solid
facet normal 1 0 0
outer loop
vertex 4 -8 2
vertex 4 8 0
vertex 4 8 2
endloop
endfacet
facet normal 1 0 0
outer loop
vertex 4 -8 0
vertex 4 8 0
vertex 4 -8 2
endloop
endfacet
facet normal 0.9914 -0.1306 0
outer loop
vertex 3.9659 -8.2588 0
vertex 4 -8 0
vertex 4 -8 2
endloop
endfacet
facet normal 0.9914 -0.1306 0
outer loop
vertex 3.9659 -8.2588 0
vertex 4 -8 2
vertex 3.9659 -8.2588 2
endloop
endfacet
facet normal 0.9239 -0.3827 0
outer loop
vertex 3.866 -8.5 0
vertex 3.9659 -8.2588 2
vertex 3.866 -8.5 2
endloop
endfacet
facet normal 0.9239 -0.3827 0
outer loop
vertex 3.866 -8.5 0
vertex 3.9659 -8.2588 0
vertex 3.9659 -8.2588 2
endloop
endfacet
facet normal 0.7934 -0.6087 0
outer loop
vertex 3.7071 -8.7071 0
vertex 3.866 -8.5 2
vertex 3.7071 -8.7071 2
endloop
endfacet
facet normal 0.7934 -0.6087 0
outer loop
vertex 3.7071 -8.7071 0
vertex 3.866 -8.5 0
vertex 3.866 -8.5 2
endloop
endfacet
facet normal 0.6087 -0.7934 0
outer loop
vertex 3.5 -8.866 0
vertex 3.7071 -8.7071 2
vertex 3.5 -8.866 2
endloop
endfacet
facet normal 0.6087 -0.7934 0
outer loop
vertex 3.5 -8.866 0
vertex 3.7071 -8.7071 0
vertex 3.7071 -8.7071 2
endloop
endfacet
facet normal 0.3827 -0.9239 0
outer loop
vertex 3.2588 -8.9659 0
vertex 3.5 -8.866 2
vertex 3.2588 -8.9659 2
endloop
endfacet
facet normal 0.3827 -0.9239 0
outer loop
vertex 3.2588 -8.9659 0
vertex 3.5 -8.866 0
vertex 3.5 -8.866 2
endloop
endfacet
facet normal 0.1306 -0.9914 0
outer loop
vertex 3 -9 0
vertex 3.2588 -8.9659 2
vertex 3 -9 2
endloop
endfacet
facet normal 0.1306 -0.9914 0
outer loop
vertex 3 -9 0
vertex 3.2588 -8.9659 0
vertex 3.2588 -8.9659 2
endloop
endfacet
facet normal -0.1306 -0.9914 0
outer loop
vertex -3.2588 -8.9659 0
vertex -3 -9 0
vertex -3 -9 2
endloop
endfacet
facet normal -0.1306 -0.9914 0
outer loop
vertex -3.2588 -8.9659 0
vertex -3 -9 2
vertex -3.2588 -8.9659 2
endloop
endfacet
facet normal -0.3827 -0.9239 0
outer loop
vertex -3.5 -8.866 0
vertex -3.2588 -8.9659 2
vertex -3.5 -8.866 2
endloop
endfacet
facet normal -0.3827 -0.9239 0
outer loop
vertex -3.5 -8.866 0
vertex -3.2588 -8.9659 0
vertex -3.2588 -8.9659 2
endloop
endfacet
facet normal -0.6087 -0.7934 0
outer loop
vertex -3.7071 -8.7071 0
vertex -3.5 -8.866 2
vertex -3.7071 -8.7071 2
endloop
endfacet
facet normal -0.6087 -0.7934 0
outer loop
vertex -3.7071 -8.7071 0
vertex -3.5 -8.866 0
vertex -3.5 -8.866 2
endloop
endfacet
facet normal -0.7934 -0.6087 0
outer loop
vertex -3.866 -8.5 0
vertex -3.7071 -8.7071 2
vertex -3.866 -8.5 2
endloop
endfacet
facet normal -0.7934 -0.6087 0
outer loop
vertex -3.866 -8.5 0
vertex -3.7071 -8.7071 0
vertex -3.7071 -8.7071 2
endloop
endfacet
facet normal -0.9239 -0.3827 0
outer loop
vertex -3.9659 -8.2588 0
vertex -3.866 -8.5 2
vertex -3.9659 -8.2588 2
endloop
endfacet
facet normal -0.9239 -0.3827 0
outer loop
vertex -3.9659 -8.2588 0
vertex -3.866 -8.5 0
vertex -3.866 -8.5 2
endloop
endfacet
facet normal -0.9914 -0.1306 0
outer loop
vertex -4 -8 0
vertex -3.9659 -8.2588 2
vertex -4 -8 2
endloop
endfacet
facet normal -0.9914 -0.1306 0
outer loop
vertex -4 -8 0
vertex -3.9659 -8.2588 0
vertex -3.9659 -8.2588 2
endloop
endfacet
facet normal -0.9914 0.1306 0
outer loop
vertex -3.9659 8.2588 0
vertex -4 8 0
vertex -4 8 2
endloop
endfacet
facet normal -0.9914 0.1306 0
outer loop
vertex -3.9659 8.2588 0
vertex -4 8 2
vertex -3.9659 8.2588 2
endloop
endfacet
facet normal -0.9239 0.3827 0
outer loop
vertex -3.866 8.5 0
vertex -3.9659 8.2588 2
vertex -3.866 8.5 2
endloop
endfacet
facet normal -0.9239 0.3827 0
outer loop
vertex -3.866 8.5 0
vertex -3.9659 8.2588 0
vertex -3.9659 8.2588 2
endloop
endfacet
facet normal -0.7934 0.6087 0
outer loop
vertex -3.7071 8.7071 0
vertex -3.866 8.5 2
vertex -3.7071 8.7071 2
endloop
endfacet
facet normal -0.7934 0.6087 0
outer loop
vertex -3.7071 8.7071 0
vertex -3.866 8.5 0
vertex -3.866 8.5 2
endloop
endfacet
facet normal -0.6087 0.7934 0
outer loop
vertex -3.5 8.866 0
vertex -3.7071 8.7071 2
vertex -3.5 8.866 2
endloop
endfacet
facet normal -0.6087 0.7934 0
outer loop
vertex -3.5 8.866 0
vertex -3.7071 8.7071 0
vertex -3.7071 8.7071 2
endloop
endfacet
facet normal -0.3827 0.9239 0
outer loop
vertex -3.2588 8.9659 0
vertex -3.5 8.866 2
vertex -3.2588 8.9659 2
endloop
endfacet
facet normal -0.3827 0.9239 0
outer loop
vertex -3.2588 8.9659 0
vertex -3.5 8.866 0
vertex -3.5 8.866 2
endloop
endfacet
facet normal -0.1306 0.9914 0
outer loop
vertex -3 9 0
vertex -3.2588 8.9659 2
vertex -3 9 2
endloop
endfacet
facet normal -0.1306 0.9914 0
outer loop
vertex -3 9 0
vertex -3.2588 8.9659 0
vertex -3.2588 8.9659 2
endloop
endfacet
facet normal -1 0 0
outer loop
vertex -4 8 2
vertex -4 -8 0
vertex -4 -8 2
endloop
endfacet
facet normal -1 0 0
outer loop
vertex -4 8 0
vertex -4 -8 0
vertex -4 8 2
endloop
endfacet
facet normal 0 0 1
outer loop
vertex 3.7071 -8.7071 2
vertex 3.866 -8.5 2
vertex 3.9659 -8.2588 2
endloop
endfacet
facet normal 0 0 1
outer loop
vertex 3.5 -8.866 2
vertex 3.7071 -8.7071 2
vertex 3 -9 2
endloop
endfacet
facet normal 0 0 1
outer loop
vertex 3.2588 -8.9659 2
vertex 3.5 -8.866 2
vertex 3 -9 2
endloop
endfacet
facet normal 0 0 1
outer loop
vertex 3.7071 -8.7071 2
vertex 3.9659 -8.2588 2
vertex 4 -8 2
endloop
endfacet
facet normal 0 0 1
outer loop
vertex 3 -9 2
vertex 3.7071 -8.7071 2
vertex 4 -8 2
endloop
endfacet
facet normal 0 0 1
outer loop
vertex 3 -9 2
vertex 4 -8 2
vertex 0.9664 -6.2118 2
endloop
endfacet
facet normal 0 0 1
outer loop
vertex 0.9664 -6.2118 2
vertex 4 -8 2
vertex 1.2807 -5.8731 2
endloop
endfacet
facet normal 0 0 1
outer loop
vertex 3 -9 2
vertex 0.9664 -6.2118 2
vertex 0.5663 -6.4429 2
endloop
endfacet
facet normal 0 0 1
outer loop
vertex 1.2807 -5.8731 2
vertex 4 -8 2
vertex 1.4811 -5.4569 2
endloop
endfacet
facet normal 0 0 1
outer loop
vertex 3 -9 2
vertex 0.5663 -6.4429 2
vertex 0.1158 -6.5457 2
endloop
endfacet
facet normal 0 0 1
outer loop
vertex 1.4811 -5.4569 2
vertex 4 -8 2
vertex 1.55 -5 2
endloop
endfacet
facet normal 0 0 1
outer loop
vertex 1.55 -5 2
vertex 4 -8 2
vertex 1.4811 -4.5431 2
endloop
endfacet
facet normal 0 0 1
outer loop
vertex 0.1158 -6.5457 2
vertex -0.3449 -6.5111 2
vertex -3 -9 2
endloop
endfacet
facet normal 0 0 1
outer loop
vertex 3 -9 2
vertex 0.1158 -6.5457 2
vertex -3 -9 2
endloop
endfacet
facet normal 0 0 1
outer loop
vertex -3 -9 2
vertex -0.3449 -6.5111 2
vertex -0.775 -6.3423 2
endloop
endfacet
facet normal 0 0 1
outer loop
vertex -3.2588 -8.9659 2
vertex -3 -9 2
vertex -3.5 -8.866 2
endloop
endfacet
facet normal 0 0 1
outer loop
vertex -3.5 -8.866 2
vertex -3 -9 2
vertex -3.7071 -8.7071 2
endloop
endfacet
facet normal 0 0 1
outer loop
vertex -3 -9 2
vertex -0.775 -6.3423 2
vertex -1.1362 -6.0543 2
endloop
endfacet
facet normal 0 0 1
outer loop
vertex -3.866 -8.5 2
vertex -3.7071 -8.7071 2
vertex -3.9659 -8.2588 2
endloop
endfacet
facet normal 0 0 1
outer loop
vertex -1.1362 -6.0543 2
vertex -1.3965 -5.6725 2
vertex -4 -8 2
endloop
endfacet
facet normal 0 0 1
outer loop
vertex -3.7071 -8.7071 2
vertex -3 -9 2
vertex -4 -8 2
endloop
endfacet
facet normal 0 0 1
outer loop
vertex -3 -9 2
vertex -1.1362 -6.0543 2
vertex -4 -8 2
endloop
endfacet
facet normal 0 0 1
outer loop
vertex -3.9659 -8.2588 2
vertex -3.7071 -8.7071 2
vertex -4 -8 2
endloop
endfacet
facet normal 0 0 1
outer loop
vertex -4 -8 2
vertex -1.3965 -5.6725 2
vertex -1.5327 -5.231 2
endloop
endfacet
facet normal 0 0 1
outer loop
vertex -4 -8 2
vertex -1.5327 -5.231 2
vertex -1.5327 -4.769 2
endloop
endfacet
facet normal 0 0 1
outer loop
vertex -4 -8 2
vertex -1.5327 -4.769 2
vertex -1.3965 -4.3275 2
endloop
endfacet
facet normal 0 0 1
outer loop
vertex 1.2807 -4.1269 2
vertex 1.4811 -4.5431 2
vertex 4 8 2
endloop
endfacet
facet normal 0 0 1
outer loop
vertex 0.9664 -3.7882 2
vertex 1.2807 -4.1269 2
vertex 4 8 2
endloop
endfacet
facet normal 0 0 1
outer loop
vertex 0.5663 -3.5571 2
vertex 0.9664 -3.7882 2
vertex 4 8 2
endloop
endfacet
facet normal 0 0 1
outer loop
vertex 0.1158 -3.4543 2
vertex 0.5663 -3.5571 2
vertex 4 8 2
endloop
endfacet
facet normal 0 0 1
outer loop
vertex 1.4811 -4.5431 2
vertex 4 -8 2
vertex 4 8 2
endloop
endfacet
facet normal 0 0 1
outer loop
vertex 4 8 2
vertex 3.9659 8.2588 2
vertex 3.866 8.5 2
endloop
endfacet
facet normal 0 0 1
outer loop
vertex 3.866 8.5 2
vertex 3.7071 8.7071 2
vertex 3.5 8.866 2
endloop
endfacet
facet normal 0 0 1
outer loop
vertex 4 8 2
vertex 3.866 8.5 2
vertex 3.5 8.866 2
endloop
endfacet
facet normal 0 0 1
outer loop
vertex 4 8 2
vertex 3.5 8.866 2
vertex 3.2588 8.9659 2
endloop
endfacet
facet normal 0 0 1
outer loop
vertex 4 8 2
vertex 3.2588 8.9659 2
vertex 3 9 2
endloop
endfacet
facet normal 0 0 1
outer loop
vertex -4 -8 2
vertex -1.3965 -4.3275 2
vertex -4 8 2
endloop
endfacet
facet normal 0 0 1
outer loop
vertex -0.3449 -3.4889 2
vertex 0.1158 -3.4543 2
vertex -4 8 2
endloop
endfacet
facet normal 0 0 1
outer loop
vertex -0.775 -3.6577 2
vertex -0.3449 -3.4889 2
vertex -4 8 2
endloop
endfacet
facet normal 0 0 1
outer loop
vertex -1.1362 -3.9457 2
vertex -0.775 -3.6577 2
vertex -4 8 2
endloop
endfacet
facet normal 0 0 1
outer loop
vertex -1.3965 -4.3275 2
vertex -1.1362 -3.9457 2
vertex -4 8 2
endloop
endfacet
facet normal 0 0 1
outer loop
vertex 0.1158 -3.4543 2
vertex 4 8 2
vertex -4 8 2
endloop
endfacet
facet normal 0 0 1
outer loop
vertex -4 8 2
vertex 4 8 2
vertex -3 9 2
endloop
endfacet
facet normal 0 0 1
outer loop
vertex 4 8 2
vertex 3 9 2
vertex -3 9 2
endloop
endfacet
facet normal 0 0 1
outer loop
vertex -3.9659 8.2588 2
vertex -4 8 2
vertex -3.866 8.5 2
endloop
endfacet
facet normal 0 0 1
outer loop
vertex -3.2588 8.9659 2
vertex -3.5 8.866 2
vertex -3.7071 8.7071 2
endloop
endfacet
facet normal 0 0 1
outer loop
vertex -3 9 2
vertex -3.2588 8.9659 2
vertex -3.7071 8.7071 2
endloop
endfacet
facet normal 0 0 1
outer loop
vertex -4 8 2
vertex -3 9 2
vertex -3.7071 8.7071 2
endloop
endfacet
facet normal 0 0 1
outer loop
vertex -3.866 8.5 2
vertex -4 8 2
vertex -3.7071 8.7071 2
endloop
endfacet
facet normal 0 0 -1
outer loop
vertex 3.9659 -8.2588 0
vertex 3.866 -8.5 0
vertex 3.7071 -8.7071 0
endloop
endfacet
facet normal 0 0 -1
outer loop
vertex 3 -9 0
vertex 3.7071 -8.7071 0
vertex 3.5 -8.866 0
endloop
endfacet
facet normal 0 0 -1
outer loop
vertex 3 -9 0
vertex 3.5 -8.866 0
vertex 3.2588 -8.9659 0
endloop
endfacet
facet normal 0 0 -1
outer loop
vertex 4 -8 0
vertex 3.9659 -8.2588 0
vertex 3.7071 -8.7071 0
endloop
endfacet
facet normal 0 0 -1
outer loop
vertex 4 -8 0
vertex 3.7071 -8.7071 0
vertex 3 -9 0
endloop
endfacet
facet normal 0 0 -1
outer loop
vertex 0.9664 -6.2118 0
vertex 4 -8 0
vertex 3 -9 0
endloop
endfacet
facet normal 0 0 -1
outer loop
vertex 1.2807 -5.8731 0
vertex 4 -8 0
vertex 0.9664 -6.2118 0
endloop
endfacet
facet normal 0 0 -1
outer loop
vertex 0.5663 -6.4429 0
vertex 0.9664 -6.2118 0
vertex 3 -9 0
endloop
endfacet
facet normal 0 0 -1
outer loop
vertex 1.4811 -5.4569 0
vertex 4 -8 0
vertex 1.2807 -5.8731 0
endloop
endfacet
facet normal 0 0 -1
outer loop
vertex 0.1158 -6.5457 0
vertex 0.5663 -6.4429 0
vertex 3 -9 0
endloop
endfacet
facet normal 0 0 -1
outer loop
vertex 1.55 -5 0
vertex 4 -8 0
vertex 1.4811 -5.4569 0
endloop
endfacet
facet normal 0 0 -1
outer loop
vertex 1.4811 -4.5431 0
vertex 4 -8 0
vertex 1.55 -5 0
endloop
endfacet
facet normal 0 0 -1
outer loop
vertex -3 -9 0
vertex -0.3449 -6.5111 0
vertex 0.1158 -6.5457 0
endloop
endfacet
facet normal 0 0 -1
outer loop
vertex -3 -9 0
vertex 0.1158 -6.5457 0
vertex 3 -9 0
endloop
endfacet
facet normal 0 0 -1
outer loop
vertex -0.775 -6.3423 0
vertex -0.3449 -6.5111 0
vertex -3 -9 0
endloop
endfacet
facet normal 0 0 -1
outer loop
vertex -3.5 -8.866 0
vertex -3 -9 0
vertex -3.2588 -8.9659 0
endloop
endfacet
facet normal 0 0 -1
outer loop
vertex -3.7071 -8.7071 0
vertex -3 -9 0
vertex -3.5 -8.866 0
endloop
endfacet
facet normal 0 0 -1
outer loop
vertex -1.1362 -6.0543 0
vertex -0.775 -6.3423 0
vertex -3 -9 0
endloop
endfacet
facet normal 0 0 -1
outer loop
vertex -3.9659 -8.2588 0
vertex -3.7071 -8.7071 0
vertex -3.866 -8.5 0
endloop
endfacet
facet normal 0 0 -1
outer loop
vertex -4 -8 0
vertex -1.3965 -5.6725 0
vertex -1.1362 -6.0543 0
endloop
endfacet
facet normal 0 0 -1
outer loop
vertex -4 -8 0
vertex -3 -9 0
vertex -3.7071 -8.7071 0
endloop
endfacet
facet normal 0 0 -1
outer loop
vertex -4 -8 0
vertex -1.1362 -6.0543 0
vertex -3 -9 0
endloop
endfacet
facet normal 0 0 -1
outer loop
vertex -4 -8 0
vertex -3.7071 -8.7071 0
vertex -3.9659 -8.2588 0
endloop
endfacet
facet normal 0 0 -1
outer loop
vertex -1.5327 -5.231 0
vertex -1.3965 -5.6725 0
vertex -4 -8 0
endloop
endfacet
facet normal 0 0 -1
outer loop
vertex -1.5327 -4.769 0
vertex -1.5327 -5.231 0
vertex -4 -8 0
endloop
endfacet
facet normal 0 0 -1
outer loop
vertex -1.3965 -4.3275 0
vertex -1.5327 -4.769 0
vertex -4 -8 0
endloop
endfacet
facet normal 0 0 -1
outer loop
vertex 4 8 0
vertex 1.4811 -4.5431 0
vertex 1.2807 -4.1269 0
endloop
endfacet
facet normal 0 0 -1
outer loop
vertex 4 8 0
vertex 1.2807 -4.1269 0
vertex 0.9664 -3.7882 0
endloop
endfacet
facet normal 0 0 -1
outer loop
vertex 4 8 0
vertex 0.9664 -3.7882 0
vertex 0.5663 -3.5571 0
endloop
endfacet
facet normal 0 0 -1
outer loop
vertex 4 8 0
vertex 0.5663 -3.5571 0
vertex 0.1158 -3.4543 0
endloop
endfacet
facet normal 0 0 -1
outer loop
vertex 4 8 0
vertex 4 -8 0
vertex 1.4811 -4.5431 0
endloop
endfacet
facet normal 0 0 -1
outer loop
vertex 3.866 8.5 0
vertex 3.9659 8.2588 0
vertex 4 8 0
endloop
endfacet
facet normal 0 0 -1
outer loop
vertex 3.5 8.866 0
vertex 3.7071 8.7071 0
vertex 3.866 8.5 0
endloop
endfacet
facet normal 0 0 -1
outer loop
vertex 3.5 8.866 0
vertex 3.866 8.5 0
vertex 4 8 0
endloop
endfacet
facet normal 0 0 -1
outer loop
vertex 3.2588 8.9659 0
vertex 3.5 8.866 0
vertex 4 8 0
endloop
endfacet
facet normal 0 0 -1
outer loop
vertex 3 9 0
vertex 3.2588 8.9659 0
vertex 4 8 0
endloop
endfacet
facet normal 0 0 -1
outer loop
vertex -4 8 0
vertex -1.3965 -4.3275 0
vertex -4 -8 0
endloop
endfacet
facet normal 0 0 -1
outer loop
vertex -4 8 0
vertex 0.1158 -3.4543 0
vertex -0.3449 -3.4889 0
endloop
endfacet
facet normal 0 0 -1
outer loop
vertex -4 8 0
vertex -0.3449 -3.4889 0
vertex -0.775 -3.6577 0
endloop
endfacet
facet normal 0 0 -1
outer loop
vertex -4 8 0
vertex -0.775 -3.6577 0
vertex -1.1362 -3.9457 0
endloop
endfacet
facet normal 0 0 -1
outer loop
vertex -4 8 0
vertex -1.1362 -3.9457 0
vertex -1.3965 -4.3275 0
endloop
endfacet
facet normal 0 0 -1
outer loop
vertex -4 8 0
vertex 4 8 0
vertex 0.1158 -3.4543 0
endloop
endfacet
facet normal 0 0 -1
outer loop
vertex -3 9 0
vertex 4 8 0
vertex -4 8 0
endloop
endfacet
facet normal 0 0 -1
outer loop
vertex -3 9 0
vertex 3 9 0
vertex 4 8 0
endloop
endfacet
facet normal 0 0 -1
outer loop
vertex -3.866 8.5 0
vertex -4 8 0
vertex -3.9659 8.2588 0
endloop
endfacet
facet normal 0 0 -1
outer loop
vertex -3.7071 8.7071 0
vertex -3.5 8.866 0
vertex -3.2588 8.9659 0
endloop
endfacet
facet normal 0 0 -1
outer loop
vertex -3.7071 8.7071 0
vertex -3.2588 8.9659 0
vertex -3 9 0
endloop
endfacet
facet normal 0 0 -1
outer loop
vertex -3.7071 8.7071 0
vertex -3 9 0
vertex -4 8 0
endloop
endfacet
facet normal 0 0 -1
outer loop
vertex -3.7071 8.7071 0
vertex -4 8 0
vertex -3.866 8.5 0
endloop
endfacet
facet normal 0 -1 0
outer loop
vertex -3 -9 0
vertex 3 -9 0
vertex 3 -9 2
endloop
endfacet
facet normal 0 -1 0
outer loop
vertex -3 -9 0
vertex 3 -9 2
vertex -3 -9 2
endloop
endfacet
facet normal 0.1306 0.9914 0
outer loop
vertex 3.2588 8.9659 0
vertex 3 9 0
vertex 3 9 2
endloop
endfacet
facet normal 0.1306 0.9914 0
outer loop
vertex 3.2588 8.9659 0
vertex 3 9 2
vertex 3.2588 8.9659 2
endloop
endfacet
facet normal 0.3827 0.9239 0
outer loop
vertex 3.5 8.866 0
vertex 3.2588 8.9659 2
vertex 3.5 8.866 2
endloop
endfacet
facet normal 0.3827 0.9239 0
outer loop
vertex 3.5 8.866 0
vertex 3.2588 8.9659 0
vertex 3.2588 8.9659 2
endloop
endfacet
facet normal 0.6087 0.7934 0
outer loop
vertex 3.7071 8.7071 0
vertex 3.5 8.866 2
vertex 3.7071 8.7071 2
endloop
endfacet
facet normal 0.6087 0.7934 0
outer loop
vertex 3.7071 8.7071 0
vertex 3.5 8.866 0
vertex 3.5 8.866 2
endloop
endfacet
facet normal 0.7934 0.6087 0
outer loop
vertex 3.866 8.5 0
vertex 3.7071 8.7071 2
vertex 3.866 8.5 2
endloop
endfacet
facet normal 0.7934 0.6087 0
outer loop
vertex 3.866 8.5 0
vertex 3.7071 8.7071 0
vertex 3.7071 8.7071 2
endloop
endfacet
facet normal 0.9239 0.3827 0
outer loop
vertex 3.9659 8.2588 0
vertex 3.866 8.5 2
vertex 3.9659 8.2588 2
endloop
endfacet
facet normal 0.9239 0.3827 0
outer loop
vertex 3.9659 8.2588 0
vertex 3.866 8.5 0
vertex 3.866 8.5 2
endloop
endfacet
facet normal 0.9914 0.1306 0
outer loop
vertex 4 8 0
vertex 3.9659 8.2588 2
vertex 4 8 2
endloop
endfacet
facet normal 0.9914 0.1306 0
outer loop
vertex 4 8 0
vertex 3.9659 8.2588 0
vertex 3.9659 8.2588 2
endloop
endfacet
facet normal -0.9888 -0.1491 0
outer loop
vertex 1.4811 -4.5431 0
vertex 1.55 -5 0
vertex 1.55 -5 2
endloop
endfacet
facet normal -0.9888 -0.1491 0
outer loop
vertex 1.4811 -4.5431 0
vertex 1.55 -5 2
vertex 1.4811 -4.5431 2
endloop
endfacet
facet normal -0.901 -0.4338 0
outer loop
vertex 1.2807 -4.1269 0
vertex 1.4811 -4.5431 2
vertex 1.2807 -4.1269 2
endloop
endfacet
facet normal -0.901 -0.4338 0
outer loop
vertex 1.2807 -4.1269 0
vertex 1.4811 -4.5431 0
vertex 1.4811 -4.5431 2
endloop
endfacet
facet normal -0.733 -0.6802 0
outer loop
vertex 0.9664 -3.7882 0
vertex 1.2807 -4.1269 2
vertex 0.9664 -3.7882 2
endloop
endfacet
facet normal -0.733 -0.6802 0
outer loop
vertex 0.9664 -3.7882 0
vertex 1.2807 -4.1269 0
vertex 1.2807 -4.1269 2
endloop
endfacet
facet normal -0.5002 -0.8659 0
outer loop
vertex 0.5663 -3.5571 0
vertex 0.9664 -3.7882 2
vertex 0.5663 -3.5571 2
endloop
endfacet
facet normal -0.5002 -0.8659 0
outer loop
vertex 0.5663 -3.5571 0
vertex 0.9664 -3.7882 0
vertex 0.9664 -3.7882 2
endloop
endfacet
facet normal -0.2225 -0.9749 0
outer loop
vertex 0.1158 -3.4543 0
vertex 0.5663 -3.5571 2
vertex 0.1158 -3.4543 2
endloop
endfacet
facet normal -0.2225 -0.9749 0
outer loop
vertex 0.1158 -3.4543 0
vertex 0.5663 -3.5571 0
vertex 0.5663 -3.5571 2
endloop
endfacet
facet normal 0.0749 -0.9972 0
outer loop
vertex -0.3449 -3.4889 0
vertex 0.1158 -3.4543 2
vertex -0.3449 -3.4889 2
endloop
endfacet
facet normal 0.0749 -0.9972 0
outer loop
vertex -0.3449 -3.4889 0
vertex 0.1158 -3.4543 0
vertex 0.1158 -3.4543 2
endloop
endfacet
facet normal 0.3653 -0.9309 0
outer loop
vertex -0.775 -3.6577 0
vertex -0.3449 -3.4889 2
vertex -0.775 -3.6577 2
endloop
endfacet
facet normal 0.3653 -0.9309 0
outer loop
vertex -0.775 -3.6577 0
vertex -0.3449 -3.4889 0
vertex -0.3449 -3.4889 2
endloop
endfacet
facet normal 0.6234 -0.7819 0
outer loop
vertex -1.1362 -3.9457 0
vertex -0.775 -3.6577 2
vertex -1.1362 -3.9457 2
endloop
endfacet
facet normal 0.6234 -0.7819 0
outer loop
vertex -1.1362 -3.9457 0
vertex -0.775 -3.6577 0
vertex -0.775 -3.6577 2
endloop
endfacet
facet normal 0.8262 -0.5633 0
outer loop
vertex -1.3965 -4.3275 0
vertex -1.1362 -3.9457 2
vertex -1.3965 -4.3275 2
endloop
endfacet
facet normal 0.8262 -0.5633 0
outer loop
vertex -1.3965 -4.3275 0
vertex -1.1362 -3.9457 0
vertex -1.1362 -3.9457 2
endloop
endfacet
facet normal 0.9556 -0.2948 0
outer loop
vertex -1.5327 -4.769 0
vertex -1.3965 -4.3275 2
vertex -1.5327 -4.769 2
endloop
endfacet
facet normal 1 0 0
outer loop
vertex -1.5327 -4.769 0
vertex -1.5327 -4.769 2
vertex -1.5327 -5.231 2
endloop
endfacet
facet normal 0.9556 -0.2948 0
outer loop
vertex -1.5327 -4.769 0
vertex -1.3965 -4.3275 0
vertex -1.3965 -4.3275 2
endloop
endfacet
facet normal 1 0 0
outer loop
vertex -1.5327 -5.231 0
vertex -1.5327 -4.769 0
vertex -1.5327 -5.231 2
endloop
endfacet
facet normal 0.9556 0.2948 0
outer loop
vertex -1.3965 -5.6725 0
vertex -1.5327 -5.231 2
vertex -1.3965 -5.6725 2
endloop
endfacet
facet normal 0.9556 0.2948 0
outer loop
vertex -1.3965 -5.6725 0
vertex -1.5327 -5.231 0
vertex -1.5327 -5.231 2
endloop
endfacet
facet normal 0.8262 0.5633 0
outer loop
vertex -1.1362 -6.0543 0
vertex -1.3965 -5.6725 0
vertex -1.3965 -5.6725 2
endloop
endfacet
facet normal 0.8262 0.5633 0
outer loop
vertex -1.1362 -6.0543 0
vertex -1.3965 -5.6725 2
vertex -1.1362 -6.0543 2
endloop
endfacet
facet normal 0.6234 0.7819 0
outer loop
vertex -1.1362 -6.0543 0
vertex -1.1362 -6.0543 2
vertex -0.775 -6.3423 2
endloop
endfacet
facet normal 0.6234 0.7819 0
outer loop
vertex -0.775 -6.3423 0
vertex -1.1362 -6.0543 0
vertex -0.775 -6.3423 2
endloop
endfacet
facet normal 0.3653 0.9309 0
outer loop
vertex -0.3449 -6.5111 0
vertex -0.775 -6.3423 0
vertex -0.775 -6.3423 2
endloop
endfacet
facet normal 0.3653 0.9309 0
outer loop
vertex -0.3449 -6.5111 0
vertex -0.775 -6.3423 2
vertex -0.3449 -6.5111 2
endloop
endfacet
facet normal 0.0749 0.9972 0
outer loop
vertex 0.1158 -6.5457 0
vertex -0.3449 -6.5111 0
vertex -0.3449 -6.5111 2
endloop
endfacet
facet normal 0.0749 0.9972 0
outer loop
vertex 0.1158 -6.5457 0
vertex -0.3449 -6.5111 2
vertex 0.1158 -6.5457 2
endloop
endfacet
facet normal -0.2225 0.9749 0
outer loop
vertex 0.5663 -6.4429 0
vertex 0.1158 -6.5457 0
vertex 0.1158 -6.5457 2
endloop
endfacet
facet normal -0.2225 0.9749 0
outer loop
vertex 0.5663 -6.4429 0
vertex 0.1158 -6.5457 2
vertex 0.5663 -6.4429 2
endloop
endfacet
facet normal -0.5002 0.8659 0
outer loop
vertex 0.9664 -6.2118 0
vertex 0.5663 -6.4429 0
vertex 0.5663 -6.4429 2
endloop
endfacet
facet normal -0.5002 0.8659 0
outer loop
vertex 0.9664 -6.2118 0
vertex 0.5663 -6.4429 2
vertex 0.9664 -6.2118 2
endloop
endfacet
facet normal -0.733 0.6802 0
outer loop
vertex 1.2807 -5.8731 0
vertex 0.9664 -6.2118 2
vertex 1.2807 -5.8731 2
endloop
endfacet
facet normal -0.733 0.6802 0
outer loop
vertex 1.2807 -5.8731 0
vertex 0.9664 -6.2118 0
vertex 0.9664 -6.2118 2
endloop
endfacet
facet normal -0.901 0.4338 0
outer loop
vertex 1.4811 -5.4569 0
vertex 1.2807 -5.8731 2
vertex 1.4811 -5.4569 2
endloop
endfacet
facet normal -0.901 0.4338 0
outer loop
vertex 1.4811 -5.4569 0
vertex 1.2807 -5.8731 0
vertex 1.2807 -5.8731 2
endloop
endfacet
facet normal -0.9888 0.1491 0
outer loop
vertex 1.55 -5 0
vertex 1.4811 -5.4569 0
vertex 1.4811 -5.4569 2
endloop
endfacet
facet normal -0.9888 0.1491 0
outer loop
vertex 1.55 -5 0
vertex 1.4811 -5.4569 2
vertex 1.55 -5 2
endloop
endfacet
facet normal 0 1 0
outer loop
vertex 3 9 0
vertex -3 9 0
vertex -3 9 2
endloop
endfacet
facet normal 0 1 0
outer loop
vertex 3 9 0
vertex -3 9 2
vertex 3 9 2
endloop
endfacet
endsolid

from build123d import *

# Parameters (mm, degrees)
SKETCH_1_R      = 1.55
EXTRUDE_1_DEPTH = 2


with BuildPart() as part:
    # 草图1 → 凸台-拉伸1 (new body)
    with BuildSketch(Plane.XY):
        with BuildLine():
            Line((-3, 9), (3, 9))
            ThreePointArc((3, 9), (3.707106781, 8.707106781), (4, 8))
            Line((4, 8), (4, -8))
            ThreePointArc((4, -8), (3.707106781, -8.707106781), (3, -9))
            Line((3, -9), (-3, -9))
            ThreePointArc((-3, -9), (-3.707106781, -8.707106781), (-4, -8))
            Line((-4, -8), (-4, 8))
            ThreePointArc((-4, 8), (-3.707106781, 8.707106781), (-3, 9))
        make_face()
        with Locations((0, -5)):
            Circle(SKETCH_1_R, mode=Mode.SUBTRACT)
    extrude(amount=EXTRUDE_1_DEPTH)


solid = part.part
